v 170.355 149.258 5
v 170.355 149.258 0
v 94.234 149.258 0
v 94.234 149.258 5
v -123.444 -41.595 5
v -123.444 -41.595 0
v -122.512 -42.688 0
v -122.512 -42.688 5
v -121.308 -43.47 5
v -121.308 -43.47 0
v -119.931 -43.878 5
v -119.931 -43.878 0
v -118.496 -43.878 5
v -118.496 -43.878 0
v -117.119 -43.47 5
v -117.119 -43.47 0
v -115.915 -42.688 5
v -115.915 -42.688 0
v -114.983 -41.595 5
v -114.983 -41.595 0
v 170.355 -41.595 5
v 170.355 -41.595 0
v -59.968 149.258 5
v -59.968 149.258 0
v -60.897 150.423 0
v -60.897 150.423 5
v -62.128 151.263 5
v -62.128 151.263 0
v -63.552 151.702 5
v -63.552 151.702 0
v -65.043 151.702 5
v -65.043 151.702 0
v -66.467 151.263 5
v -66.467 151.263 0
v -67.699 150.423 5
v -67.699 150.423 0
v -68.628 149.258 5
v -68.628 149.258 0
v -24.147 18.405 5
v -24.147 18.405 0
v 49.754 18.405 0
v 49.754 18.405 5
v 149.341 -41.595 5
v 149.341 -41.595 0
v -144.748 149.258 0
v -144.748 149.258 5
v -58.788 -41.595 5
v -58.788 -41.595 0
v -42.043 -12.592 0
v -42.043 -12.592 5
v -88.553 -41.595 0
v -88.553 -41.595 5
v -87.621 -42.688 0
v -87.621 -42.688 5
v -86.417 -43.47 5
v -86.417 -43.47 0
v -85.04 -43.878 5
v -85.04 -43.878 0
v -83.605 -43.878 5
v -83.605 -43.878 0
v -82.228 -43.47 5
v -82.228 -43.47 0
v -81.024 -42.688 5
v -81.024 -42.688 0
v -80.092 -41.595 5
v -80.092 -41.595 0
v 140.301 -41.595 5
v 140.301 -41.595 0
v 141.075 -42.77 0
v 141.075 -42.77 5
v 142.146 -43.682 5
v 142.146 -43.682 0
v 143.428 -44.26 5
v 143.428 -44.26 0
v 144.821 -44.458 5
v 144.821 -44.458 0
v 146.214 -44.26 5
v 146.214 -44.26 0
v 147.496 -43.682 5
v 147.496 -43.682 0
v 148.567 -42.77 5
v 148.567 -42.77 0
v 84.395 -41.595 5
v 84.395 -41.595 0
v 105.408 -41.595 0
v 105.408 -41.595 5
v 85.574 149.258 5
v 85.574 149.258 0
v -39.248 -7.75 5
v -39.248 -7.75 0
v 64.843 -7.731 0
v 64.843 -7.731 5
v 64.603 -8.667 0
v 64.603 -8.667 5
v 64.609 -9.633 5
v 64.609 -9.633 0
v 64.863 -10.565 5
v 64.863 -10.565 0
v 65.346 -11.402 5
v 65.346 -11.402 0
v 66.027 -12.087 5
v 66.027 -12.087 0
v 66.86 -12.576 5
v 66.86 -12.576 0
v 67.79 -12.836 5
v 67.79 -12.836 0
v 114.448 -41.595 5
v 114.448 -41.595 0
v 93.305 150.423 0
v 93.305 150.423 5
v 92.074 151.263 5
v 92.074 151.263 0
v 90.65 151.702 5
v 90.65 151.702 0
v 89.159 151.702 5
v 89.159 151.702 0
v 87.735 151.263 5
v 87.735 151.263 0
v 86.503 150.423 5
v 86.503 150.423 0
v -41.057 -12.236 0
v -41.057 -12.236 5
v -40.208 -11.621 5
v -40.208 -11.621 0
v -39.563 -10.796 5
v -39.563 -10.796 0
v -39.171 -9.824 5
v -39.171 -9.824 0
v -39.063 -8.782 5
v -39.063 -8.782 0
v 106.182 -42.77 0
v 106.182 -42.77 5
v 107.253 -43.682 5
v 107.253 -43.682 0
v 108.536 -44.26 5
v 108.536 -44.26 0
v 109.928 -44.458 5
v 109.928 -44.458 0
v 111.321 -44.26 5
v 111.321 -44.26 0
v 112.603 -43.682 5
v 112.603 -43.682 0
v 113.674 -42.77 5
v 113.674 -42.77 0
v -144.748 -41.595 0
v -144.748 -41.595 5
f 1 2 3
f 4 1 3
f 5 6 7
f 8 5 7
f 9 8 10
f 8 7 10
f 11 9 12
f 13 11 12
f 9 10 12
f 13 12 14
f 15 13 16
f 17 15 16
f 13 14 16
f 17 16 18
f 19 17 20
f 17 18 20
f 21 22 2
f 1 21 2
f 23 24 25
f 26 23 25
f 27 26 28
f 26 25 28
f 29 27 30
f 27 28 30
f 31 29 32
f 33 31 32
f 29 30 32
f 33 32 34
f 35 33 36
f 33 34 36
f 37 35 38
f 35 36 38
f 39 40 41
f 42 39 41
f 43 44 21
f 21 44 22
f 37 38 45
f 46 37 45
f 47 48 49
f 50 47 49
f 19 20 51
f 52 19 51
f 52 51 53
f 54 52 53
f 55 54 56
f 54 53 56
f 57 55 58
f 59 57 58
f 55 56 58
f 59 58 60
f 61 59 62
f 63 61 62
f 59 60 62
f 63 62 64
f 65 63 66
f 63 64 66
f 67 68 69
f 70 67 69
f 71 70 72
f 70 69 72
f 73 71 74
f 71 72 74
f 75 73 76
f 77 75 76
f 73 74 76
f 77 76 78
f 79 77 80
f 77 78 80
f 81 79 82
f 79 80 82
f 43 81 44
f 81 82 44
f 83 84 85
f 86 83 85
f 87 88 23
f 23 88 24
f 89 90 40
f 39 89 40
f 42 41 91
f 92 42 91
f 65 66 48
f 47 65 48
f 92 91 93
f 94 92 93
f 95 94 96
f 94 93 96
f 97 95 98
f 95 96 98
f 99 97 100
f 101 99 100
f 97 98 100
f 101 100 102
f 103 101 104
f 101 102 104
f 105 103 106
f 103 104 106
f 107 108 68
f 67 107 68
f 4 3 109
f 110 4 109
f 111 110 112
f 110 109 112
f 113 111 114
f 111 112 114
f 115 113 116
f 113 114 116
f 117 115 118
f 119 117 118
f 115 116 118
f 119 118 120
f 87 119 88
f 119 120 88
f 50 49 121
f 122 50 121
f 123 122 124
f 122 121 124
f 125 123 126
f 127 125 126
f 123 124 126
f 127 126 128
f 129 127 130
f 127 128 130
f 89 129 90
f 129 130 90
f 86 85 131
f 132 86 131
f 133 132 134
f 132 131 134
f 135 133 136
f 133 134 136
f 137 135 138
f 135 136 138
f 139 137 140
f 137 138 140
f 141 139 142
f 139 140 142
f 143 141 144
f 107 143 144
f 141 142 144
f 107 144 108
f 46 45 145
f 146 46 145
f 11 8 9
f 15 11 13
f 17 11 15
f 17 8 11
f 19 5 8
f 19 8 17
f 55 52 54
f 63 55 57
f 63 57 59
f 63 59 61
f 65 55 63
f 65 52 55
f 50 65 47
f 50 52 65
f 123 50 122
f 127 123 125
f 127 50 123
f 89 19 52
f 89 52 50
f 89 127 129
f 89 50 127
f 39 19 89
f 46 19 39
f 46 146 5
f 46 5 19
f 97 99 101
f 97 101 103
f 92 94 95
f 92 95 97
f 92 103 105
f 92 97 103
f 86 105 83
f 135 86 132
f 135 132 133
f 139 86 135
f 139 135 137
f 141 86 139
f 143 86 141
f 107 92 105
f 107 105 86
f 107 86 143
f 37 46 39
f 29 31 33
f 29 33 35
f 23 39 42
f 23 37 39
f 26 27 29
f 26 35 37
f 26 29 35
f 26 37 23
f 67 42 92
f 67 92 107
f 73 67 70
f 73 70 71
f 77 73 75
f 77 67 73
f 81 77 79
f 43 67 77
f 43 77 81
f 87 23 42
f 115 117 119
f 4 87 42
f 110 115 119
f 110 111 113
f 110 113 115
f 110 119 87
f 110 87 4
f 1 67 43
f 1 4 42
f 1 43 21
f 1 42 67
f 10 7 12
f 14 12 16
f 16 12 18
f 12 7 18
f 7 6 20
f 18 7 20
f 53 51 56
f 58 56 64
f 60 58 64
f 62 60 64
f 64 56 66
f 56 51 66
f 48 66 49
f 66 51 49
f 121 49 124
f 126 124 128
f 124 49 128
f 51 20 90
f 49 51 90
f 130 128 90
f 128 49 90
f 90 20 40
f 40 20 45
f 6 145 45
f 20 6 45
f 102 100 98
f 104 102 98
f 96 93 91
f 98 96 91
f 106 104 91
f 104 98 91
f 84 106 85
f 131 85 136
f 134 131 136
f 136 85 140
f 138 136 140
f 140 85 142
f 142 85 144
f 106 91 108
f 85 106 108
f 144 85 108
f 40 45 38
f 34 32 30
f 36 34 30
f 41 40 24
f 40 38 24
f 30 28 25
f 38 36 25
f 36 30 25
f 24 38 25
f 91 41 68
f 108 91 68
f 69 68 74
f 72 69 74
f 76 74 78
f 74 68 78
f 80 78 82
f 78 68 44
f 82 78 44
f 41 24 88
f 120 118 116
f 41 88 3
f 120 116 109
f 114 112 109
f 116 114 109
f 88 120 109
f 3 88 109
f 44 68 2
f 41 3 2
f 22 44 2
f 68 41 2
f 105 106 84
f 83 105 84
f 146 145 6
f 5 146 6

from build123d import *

# Parameters (mm, degrees)
BOSS_EXTRUDE1_DEPTH = 5


with BuildPart() as part:
    # Sketch1 → Boss-Extrude1 (new body)
    with BuildSketch(Plane.XY):
        with BuildLine():
            Line((-114.983429669, -41.595326503), (-88.552733296, -41.595326503))
            ThreePointArc((-88.552733296, -41.595326503), (-84.32255291, -43.929698265), (-80.092372525, -41.595326503))
            Line((-80.092372525, -41.595326503), (-58.788151834, -41.595326503))
            Line((-58.788151834, -41.595326503), (-42.04280008, -12.591526475))
            ThreePointArc((-42.04280008, -12.591526475), (-39.562725839, -10.795911883), (-39.247715108, -7.750297292))
            Line((-39.247715108, -7.750297292), (-24.147135682, 18.404673497))
            Line((-24.147135682, 18.404673497), (49.753698774, 18.404673497))
            Line((49.753698774, 18.404673497), (64.843098402, -7.730933315))
            ThreePointArc((64.843098402, -7.730933315), (65.07717154, -10.998946288), (67.790317225, -12.835666057))
            Line((67.790317225, -12.835666057), (84.394714925, -41.595326503))
            Line((84.394714925, -41.595326503), (105.408163945, -41.595326503))
            ThreePointArc((105.408163945, -41.595326503), (109.928281546, -44.457912909), (114.448399147, -41.595326503))
            Line((114.448399147, -41.595326503), (140.300890001, -41.595326503))
            ThreePointArc((140.300890001, -41.595326503), (144.821007602, -44.457912909), (149.341125203, -41.595326503))
            Line((149.341125203, -41.595326503), (170.354574223, -41.595326503))
            Line((170.354574223, -41.595326503), (170.354574223, 149.258117984))
            Line((170.354574223, 149.258117984), (94.234420776, 149.258117984))
            ThreePointArc((94.234420776, 149.258117984), (89.904293757, 151.758117984), (85.574166738, 149.258117984))
            Line((85.574166738, 149.258117984), (-59.967510158, 149.258117984))
            ThreePointArc((-59.967510158, 149.258117984), (-64.297637177, 151.758117984), (-68.627764196, 149.258117984))
            Line((-68.627764196, 149.258117984), (-144.748011131, 149.258117984))
            Line((-144.748011131, 149.258117984), (-144.748011131, -41.595326503))
            Line((-144.748011131, -41.595326503), (-123.44379044, -41.595326503))
            ThreePointArc((-123.44379044, -41.595326503), (-119.213610054, -43.929698265), (-114.983429669, -41.595326503))
        make_face()
    extrude(amount=BOSS_EXTRUDE1_DEPTH)


solid = part.part
